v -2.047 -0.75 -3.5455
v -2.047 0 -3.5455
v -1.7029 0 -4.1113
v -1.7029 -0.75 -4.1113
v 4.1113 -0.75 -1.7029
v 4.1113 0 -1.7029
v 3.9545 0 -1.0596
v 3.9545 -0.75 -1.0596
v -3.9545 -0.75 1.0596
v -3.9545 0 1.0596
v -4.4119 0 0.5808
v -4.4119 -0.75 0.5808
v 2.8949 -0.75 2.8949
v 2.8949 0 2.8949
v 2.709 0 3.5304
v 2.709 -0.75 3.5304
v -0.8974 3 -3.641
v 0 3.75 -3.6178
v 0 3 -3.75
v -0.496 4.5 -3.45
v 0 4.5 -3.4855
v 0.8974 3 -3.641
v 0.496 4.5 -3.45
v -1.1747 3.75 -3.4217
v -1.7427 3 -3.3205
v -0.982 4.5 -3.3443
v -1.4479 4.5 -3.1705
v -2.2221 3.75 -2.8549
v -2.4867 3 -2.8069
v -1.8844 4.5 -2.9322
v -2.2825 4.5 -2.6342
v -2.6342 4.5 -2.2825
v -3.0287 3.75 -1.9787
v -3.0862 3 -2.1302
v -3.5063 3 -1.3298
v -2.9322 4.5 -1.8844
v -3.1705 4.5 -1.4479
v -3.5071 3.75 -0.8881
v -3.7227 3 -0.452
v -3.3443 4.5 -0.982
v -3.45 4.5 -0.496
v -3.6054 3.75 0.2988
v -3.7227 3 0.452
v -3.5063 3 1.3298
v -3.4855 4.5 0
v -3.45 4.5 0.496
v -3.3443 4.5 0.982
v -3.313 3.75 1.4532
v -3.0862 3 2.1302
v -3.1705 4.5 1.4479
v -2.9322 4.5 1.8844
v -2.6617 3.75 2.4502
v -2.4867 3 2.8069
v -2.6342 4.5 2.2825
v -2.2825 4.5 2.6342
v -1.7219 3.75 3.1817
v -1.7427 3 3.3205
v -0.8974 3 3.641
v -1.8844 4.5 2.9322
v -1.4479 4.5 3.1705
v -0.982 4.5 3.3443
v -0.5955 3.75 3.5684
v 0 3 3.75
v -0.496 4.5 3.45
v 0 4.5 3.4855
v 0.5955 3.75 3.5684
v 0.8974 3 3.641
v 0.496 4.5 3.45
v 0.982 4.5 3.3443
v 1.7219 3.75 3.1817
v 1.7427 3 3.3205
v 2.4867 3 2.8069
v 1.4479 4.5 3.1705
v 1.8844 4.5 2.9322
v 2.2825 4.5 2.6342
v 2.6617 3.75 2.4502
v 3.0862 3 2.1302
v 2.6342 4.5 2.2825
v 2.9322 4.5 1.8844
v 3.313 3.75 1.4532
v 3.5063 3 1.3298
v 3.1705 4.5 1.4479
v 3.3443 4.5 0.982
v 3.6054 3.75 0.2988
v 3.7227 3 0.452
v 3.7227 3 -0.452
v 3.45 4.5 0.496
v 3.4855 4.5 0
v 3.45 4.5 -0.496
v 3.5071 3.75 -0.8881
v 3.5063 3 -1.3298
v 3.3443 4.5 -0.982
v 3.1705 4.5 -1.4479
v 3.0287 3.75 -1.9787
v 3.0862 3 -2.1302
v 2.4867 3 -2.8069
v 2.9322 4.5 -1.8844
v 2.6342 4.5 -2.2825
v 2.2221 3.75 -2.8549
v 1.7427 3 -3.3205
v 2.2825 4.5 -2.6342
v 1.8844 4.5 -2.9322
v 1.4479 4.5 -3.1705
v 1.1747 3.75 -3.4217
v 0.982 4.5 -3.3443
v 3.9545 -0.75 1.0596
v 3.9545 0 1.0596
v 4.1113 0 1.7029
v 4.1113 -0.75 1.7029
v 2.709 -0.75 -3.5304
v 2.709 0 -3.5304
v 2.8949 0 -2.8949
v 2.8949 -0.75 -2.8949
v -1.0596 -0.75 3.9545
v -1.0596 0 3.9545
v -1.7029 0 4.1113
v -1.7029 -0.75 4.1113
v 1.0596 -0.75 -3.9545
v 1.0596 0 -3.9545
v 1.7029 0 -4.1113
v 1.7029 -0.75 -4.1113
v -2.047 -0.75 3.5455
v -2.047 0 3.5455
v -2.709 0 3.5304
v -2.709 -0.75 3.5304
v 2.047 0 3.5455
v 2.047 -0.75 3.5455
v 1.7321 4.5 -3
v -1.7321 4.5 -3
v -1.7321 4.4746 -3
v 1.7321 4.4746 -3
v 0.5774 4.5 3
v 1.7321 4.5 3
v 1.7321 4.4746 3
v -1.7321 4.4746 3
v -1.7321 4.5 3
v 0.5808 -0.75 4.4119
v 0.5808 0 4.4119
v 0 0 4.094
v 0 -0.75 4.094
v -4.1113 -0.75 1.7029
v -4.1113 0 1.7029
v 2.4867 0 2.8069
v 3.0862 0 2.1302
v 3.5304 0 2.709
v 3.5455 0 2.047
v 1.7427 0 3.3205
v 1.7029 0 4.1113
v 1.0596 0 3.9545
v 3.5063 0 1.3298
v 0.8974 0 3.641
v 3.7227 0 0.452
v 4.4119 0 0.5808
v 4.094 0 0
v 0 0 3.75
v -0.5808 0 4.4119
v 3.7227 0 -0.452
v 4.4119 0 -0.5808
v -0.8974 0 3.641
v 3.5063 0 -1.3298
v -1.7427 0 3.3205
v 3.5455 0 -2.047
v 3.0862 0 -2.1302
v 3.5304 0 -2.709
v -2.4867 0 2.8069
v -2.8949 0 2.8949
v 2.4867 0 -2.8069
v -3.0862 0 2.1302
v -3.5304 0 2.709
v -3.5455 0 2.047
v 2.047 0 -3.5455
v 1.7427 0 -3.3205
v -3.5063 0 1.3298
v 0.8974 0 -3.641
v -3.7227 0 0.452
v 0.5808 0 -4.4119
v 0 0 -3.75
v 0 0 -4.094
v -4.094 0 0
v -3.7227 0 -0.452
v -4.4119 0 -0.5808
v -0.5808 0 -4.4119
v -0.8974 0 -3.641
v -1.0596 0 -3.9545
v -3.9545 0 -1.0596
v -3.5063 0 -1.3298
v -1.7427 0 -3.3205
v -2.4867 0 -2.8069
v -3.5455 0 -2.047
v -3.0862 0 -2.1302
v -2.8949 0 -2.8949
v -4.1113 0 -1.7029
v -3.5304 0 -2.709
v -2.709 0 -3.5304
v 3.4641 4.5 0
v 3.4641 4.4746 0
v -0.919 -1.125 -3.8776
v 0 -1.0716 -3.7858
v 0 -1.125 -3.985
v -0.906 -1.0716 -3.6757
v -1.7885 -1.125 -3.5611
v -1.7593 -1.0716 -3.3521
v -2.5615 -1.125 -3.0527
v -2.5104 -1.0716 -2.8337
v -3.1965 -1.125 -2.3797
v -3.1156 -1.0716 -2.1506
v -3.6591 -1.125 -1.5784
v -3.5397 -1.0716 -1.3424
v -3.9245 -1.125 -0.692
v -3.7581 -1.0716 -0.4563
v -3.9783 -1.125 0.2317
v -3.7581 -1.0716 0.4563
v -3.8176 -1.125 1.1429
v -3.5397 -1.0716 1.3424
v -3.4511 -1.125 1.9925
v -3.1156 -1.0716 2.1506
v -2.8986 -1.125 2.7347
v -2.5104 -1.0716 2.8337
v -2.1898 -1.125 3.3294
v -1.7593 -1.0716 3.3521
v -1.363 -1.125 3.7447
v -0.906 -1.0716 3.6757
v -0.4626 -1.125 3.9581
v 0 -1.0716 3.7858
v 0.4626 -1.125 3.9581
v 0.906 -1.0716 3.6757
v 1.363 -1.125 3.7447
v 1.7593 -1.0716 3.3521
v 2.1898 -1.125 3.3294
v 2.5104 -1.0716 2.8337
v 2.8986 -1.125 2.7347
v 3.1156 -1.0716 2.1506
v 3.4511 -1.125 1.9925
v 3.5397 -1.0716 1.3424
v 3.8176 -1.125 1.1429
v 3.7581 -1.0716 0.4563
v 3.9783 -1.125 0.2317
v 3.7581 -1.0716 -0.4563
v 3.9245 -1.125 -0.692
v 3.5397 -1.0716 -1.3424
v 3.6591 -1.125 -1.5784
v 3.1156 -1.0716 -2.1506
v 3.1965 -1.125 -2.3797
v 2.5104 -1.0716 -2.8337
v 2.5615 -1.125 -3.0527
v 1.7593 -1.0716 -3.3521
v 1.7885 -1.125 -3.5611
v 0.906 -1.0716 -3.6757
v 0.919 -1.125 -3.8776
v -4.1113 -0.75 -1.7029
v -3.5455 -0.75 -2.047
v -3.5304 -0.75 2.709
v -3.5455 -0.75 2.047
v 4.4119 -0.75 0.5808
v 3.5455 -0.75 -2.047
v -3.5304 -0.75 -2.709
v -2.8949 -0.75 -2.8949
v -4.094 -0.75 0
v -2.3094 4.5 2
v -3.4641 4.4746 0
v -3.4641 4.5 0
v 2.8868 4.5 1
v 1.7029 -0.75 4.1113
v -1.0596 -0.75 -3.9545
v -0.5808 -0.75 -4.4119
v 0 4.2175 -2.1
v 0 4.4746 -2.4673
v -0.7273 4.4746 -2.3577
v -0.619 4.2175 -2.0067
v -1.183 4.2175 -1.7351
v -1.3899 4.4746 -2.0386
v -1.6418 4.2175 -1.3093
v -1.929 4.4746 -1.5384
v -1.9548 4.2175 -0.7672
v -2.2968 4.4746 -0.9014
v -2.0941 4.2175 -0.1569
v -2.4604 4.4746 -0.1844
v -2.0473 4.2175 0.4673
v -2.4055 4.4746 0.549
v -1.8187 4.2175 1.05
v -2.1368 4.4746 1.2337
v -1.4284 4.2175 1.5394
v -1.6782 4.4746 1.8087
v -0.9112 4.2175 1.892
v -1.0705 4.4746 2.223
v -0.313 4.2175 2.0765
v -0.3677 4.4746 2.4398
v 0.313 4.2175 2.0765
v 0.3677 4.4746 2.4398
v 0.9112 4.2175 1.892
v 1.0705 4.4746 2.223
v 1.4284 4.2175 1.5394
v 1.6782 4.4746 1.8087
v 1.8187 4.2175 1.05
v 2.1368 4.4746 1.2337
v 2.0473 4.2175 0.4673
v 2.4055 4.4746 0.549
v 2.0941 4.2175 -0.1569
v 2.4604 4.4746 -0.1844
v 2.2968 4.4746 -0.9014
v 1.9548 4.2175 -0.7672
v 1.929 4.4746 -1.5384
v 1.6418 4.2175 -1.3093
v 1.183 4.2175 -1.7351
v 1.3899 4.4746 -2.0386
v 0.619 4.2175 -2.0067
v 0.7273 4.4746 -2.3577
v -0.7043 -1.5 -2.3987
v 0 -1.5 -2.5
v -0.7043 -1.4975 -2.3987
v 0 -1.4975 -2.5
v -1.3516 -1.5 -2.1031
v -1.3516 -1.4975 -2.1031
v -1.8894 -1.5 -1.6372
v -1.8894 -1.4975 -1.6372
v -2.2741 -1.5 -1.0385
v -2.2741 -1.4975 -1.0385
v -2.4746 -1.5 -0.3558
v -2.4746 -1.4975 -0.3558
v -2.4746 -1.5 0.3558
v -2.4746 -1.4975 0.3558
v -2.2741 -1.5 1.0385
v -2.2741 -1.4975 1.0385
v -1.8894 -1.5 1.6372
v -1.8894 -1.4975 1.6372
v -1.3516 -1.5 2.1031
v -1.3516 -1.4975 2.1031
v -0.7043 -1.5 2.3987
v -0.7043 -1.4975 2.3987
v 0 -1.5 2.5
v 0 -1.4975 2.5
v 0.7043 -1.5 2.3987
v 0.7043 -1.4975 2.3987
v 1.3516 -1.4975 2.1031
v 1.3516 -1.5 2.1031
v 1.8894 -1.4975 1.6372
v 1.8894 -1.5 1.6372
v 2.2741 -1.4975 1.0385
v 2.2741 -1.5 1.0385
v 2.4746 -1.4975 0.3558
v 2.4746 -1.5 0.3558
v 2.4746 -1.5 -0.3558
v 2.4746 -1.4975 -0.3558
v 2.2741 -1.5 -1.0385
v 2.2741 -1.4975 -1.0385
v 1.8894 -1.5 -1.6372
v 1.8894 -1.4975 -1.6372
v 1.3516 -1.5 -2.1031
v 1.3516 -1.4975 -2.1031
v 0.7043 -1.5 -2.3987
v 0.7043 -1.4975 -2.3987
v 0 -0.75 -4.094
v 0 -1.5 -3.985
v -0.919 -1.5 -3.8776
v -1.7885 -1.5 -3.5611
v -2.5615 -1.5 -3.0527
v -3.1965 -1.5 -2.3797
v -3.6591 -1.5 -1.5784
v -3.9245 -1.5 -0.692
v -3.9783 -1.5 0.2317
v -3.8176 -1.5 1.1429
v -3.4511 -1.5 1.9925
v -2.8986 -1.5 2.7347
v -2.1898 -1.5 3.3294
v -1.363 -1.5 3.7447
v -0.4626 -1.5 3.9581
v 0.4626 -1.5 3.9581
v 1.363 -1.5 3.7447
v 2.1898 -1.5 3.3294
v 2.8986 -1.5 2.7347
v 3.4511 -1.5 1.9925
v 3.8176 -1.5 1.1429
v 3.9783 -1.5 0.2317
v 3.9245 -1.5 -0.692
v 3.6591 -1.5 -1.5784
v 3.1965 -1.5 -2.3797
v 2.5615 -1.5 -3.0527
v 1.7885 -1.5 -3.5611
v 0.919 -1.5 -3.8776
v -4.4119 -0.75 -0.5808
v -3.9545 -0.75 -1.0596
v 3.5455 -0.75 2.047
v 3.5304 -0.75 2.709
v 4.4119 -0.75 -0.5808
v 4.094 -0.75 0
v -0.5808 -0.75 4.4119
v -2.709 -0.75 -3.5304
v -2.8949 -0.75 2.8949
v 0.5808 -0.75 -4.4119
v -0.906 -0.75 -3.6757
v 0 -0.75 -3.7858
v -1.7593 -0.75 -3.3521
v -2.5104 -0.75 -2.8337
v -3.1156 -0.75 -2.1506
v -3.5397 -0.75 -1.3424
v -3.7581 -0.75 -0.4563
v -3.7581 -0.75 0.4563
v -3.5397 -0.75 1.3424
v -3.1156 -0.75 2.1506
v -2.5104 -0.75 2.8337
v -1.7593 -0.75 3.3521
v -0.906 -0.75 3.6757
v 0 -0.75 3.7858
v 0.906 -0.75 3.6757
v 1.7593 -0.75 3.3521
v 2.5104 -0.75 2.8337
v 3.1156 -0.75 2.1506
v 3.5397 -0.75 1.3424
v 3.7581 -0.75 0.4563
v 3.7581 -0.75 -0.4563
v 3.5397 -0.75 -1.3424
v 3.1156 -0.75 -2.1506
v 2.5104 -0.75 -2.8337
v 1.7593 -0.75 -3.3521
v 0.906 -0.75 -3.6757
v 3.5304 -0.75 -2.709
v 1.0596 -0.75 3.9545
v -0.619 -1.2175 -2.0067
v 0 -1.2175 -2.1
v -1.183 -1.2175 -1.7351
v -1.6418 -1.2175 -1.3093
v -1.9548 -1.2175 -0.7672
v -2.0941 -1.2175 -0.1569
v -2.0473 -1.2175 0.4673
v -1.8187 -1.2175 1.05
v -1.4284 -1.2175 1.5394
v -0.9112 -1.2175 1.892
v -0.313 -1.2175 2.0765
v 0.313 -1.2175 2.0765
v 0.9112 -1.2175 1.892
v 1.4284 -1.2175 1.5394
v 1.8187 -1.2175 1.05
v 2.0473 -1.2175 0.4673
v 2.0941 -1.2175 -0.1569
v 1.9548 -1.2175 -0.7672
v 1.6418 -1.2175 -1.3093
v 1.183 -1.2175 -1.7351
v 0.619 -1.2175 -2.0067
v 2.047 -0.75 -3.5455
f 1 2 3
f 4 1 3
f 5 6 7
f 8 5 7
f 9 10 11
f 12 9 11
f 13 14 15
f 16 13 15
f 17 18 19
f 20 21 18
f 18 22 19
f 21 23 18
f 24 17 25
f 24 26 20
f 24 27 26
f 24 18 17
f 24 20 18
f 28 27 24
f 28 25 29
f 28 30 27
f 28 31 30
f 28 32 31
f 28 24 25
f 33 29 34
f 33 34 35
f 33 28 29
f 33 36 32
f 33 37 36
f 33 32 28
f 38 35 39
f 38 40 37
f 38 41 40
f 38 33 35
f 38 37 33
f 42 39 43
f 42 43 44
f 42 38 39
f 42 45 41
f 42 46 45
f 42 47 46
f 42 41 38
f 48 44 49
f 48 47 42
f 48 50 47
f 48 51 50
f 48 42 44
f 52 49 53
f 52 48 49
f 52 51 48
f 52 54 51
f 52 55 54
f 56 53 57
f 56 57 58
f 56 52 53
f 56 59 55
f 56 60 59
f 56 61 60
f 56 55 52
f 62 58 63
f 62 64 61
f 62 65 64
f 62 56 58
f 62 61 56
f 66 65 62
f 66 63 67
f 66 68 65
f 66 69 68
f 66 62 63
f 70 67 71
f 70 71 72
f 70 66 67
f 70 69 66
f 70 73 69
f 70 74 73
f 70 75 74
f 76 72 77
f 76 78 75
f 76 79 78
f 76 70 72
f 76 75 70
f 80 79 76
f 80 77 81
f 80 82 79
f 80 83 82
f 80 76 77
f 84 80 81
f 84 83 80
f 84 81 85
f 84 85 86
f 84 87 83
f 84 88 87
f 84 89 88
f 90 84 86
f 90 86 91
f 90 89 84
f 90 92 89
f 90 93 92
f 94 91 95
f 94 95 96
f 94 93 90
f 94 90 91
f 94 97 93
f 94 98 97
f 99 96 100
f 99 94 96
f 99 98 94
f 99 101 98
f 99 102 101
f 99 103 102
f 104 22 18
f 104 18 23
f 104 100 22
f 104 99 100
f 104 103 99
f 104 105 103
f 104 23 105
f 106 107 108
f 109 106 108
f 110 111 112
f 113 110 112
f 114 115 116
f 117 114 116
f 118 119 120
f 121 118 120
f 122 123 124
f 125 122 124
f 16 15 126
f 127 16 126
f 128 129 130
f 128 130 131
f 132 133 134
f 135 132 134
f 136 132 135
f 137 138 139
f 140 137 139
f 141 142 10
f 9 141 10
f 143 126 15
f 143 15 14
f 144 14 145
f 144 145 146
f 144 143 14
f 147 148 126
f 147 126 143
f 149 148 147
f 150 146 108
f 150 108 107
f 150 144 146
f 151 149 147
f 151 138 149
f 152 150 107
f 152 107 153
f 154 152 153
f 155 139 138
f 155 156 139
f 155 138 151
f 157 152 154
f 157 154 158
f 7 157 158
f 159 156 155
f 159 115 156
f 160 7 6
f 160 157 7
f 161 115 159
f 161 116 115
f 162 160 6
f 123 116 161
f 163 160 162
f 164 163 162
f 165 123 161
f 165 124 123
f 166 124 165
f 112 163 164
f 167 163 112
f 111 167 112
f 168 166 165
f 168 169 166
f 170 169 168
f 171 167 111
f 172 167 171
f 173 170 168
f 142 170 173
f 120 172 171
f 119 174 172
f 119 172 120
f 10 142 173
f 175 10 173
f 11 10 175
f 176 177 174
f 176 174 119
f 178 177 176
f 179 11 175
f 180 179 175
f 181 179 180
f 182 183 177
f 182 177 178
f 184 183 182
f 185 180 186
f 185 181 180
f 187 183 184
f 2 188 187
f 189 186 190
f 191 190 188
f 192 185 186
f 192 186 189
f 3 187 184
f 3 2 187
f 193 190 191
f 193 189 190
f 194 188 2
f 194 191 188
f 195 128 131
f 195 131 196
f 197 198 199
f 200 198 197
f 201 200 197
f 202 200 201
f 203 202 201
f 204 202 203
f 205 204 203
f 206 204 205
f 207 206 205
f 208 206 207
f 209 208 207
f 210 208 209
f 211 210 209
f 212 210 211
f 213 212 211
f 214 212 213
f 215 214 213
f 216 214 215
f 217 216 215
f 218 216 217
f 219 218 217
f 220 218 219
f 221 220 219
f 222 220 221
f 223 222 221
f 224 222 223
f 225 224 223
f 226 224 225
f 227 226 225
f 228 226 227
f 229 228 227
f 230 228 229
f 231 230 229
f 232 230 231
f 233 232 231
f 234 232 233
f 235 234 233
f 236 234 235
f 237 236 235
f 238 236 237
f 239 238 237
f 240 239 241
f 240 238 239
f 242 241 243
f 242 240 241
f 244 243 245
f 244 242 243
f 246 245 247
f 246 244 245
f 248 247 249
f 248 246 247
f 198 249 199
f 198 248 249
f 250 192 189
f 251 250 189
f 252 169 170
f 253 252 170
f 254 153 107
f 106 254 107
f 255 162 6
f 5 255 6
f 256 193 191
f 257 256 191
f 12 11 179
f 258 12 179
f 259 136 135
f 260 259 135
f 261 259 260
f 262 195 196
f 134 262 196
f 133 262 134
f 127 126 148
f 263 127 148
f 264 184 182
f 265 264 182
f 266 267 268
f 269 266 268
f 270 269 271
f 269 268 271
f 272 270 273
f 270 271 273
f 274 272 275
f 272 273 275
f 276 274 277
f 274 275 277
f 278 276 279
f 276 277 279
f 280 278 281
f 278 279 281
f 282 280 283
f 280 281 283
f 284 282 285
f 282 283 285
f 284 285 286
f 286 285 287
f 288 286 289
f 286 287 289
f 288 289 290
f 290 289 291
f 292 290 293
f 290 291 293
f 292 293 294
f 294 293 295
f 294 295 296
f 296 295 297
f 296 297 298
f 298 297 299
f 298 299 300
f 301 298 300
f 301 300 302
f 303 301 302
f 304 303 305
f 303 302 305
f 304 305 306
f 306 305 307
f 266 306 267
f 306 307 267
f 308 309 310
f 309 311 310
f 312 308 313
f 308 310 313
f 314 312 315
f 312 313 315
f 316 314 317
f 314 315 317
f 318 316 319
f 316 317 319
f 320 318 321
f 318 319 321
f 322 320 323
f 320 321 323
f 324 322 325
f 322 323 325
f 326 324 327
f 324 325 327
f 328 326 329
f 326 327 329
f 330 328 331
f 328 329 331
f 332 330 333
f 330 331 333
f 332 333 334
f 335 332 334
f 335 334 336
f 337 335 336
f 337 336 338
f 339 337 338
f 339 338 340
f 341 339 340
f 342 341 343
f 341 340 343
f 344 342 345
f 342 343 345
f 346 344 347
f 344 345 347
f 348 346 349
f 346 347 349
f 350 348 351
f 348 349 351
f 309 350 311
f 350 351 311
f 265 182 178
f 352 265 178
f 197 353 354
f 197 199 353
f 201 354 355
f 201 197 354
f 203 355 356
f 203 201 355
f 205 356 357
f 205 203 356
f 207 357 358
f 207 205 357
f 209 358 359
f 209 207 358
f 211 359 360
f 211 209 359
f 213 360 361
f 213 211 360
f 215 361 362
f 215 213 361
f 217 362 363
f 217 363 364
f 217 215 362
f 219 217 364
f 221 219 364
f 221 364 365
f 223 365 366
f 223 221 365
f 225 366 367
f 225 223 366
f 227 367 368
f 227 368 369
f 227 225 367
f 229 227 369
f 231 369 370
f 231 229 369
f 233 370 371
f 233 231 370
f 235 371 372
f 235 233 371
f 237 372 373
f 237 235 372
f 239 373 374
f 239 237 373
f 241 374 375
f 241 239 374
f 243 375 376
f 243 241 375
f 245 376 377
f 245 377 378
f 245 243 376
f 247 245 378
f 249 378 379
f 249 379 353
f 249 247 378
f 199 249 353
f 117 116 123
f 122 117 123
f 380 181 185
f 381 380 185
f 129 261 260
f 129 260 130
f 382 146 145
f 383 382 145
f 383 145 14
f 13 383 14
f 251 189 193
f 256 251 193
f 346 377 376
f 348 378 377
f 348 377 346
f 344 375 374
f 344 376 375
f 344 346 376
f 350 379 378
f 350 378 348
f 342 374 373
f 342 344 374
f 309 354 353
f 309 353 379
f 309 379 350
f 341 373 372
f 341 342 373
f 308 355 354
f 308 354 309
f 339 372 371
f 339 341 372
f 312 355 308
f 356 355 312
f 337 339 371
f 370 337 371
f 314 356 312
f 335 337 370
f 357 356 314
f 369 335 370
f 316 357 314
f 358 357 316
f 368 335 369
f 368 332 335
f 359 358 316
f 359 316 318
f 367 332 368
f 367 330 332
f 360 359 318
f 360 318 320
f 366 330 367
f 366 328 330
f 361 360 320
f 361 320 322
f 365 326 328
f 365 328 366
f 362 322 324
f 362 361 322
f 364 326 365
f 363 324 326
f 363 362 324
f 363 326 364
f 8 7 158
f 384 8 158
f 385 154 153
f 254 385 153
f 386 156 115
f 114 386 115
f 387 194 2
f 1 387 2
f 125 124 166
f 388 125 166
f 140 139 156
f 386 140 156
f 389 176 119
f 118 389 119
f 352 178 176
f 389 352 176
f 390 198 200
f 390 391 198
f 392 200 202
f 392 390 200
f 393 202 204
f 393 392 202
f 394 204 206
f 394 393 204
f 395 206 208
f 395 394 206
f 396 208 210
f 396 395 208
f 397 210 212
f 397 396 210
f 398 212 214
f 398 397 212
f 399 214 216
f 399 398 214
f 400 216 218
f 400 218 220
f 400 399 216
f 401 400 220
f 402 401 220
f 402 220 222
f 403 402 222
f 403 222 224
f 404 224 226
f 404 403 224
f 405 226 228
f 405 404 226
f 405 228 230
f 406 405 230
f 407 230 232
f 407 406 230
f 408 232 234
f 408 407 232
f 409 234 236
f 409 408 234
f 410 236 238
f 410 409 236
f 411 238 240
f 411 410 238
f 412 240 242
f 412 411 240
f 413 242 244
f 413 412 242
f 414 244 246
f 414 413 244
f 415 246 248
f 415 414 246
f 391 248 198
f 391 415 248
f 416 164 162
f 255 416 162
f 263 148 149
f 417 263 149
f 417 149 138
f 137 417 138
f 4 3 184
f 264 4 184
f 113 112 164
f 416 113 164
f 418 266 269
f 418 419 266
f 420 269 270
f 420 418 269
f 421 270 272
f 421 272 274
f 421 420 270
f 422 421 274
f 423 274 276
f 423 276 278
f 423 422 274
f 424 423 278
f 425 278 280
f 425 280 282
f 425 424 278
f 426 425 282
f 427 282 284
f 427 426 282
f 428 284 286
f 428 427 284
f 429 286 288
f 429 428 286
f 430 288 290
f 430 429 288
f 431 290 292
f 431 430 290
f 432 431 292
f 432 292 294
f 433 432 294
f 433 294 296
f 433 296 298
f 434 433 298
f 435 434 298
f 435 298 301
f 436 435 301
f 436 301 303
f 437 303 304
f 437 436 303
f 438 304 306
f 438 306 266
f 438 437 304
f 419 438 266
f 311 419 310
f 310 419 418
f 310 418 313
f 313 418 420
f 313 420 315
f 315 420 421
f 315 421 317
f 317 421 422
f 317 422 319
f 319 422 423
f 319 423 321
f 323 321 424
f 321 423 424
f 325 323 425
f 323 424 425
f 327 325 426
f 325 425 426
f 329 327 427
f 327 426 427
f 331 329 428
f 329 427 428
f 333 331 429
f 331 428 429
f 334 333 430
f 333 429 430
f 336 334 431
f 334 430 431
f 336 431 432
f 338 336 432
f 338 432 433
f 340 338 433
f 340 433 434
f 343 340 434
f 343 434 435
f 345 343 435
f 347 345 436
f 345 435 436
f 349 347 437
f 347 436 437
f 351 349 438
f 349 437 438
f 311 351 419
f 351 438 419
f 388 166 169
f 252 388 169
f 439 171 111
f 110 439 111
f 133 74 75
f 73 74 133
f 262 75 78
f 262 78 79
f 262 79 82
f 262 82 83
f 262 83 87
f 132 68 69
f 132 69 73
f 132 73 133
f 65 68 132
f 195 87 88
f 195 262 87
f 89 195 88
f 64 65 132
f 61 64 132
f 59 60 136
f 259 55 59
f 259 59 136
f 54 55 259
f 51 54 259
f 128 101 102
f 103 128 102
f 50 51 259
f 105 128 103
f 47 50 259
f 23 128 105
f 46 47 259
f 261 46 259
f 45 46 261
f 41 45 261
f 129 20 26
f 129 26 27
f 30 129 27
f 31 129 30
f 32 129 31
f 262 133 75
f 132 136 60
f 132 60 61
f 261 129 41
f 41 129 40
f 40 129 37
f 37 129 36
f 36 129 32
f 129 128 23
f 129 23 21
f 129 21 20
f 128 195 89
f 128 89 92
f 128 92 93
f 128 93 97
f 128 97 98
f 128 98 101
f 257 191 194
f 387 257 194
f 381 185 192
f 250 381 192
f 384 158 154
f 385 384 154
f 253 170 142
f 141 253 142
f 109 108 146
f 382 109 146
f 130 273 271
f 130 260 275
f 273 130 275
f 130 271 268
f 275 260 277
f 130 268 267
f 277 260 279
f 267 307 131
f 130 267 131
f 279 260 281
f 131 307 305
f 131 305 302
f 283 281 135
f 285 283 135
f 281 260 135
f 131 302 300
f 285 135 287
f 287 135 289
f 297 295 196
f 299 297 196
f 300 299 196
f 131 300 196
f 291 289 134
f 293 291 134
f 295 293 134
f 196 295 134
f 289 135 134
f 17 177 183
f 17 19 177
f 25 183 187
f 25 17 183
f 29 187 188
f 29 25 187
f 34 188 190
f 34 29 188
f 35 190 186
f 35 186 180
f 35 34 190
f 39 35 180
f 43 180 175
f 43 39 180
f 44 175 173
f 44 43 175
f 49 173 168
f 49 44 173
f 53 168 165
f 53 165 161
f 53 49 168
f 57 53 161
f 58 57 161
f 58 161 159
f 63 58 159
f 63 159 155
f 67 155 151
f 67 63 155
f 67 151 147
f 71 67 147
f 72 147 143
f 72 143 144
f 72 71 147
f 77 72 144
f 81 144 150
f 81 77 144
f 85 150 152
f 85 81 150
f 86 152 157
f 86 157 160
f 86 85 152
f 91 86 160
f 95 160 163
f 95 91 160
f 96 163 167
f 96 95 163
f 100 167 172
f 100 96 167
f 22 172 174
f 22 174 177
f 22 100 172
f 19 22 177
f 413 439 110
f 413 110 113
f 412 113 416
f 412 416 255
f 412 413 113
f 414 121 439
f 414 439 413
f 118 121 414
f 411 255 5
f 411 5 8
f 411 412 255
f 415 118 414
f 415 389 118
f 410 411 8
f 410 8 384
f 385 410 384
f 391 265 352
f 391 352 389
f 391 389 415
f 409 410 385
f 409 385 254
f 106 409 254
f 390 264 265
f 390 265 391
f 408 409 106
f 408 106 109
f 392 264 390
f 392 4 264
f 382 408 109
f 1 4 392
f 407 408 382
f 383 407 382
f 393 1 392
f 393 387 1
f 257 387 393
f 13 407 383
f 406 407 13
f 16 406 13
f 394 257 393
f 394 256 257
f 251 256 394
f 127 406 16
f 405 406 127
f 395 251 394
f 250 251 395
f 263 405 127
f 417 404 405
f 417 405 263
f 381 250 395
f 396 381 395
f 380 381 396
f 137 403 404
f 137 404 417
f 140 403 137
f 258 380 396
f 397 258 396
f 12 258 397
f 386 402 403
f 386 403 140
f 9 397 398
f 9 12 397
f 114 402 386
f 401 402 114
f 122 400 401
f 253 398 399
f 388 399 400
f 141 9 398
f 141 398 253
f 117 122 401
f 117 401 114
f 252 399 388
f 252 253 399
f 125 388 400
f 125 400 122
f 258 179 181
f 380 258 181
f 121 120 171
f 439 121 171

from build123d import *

# Parameters (mm, degrees)
CLINCHCUT_START    = -0.75
CLINCHCUT_DEPTH    = 0.75
CLINCHCUTPAT_COUNT = 24
CLINCHCUTPAT_ANGLE = 345
HEXCUT_DEPTH       = 0.0254


with BuildPart() as part:
    # BodySke → Body (revolve)
    with BuildSketch(Plane.XY, mode=Mode.PRIVATE) as body_sk:
        Polygon((3.78575, -1.071611123), (3.78575, -0.75), (4.45, -0.75), (4.45, 0), (3.75, 0), (3.75, 3), (3.485509529, 4.5), (2.1, 4.5), (2.1, -1.5), (3.985, -1.5), (3.985, -1.125), align=None)
    revolve(body_sk.sketch.rotate(Axis((0, -1.125, 0), (0, 1, 0)), 90), axis=Axis((0, -1.125, 0), (0, 1, 0)))

    # EndChamferSke → EndChamfer (revolve, cut)
    with BuildSketch(Plane.XY, mode=Mode.PRIVATE) as endchamfer_sk:
        Polygon((2.5, -1.754), (2.5, -1.49746), (2.1, -1.217481014), (2.1, -1.754), align=None)
        Polygon((2.5, 4.49746), (2.5, 4.754), (2.1, 4.754), (2.1, 4.217481014), align=None)
    revolve(endchamfer_sk.sketch.rotate(Axis((0, -2.54, 0), (0, 1, 0)), 90), axis=Axis((0, -2.54, 0), (0, 1, 0)), mode=Mode.SUBTRACT)

    # CliRinCutSke → ClinchCut (cut)
    with BuildSketch(Plane.XZ.offset(0.75).offset(CLINCHCUT_START)):
        with BuildLine():
            Line((0.580841555, 4.411929633), (0, 4.094))
            Line((0, 4.094), (-0.580841555, 4.411929633))
            ThreePointArc((-0.580841555, 4.411929633), (0, 4.45), (0.580841555, 4.411929633))
        make_face()
    clinchcut = extrude(amount=CLINCHCUT_DEPTH, mode=Mode.SUBTRACT)

    # ClinchCutPat: ClinchCut ×24 about axis
    clinchcutpat_axis = Axis((0, 0, 0), (0, 1, 0))
    for i in range(1, CLINCHCUTPAT_COUNT):
        add(clinchcut.rotate(clinchcutpat_axis, i * CLINCHCUTPAT_ANGLE / (CLINCHCUTPAT_COUNT - 1)), mode=Mode.SUBTRACT)

    # HexCutSke → HexCut (cut)
    with BuildSketch(Plane(origin=(0, 4.5, 0), x_dir=(-1, 0, 0), z_dir=(0, 1, 0))):
        Polygon((-1.732050808, 3), (1.732050808, 3), (3.464101615, 0), (1.732050808, -3), (-1.732050808, -3), (-3.464101615, 0), align=None)
    extrude(amount=-HEXCUT_DEPTH, mode=Mode.SUBTRACT)


solid = part.part
